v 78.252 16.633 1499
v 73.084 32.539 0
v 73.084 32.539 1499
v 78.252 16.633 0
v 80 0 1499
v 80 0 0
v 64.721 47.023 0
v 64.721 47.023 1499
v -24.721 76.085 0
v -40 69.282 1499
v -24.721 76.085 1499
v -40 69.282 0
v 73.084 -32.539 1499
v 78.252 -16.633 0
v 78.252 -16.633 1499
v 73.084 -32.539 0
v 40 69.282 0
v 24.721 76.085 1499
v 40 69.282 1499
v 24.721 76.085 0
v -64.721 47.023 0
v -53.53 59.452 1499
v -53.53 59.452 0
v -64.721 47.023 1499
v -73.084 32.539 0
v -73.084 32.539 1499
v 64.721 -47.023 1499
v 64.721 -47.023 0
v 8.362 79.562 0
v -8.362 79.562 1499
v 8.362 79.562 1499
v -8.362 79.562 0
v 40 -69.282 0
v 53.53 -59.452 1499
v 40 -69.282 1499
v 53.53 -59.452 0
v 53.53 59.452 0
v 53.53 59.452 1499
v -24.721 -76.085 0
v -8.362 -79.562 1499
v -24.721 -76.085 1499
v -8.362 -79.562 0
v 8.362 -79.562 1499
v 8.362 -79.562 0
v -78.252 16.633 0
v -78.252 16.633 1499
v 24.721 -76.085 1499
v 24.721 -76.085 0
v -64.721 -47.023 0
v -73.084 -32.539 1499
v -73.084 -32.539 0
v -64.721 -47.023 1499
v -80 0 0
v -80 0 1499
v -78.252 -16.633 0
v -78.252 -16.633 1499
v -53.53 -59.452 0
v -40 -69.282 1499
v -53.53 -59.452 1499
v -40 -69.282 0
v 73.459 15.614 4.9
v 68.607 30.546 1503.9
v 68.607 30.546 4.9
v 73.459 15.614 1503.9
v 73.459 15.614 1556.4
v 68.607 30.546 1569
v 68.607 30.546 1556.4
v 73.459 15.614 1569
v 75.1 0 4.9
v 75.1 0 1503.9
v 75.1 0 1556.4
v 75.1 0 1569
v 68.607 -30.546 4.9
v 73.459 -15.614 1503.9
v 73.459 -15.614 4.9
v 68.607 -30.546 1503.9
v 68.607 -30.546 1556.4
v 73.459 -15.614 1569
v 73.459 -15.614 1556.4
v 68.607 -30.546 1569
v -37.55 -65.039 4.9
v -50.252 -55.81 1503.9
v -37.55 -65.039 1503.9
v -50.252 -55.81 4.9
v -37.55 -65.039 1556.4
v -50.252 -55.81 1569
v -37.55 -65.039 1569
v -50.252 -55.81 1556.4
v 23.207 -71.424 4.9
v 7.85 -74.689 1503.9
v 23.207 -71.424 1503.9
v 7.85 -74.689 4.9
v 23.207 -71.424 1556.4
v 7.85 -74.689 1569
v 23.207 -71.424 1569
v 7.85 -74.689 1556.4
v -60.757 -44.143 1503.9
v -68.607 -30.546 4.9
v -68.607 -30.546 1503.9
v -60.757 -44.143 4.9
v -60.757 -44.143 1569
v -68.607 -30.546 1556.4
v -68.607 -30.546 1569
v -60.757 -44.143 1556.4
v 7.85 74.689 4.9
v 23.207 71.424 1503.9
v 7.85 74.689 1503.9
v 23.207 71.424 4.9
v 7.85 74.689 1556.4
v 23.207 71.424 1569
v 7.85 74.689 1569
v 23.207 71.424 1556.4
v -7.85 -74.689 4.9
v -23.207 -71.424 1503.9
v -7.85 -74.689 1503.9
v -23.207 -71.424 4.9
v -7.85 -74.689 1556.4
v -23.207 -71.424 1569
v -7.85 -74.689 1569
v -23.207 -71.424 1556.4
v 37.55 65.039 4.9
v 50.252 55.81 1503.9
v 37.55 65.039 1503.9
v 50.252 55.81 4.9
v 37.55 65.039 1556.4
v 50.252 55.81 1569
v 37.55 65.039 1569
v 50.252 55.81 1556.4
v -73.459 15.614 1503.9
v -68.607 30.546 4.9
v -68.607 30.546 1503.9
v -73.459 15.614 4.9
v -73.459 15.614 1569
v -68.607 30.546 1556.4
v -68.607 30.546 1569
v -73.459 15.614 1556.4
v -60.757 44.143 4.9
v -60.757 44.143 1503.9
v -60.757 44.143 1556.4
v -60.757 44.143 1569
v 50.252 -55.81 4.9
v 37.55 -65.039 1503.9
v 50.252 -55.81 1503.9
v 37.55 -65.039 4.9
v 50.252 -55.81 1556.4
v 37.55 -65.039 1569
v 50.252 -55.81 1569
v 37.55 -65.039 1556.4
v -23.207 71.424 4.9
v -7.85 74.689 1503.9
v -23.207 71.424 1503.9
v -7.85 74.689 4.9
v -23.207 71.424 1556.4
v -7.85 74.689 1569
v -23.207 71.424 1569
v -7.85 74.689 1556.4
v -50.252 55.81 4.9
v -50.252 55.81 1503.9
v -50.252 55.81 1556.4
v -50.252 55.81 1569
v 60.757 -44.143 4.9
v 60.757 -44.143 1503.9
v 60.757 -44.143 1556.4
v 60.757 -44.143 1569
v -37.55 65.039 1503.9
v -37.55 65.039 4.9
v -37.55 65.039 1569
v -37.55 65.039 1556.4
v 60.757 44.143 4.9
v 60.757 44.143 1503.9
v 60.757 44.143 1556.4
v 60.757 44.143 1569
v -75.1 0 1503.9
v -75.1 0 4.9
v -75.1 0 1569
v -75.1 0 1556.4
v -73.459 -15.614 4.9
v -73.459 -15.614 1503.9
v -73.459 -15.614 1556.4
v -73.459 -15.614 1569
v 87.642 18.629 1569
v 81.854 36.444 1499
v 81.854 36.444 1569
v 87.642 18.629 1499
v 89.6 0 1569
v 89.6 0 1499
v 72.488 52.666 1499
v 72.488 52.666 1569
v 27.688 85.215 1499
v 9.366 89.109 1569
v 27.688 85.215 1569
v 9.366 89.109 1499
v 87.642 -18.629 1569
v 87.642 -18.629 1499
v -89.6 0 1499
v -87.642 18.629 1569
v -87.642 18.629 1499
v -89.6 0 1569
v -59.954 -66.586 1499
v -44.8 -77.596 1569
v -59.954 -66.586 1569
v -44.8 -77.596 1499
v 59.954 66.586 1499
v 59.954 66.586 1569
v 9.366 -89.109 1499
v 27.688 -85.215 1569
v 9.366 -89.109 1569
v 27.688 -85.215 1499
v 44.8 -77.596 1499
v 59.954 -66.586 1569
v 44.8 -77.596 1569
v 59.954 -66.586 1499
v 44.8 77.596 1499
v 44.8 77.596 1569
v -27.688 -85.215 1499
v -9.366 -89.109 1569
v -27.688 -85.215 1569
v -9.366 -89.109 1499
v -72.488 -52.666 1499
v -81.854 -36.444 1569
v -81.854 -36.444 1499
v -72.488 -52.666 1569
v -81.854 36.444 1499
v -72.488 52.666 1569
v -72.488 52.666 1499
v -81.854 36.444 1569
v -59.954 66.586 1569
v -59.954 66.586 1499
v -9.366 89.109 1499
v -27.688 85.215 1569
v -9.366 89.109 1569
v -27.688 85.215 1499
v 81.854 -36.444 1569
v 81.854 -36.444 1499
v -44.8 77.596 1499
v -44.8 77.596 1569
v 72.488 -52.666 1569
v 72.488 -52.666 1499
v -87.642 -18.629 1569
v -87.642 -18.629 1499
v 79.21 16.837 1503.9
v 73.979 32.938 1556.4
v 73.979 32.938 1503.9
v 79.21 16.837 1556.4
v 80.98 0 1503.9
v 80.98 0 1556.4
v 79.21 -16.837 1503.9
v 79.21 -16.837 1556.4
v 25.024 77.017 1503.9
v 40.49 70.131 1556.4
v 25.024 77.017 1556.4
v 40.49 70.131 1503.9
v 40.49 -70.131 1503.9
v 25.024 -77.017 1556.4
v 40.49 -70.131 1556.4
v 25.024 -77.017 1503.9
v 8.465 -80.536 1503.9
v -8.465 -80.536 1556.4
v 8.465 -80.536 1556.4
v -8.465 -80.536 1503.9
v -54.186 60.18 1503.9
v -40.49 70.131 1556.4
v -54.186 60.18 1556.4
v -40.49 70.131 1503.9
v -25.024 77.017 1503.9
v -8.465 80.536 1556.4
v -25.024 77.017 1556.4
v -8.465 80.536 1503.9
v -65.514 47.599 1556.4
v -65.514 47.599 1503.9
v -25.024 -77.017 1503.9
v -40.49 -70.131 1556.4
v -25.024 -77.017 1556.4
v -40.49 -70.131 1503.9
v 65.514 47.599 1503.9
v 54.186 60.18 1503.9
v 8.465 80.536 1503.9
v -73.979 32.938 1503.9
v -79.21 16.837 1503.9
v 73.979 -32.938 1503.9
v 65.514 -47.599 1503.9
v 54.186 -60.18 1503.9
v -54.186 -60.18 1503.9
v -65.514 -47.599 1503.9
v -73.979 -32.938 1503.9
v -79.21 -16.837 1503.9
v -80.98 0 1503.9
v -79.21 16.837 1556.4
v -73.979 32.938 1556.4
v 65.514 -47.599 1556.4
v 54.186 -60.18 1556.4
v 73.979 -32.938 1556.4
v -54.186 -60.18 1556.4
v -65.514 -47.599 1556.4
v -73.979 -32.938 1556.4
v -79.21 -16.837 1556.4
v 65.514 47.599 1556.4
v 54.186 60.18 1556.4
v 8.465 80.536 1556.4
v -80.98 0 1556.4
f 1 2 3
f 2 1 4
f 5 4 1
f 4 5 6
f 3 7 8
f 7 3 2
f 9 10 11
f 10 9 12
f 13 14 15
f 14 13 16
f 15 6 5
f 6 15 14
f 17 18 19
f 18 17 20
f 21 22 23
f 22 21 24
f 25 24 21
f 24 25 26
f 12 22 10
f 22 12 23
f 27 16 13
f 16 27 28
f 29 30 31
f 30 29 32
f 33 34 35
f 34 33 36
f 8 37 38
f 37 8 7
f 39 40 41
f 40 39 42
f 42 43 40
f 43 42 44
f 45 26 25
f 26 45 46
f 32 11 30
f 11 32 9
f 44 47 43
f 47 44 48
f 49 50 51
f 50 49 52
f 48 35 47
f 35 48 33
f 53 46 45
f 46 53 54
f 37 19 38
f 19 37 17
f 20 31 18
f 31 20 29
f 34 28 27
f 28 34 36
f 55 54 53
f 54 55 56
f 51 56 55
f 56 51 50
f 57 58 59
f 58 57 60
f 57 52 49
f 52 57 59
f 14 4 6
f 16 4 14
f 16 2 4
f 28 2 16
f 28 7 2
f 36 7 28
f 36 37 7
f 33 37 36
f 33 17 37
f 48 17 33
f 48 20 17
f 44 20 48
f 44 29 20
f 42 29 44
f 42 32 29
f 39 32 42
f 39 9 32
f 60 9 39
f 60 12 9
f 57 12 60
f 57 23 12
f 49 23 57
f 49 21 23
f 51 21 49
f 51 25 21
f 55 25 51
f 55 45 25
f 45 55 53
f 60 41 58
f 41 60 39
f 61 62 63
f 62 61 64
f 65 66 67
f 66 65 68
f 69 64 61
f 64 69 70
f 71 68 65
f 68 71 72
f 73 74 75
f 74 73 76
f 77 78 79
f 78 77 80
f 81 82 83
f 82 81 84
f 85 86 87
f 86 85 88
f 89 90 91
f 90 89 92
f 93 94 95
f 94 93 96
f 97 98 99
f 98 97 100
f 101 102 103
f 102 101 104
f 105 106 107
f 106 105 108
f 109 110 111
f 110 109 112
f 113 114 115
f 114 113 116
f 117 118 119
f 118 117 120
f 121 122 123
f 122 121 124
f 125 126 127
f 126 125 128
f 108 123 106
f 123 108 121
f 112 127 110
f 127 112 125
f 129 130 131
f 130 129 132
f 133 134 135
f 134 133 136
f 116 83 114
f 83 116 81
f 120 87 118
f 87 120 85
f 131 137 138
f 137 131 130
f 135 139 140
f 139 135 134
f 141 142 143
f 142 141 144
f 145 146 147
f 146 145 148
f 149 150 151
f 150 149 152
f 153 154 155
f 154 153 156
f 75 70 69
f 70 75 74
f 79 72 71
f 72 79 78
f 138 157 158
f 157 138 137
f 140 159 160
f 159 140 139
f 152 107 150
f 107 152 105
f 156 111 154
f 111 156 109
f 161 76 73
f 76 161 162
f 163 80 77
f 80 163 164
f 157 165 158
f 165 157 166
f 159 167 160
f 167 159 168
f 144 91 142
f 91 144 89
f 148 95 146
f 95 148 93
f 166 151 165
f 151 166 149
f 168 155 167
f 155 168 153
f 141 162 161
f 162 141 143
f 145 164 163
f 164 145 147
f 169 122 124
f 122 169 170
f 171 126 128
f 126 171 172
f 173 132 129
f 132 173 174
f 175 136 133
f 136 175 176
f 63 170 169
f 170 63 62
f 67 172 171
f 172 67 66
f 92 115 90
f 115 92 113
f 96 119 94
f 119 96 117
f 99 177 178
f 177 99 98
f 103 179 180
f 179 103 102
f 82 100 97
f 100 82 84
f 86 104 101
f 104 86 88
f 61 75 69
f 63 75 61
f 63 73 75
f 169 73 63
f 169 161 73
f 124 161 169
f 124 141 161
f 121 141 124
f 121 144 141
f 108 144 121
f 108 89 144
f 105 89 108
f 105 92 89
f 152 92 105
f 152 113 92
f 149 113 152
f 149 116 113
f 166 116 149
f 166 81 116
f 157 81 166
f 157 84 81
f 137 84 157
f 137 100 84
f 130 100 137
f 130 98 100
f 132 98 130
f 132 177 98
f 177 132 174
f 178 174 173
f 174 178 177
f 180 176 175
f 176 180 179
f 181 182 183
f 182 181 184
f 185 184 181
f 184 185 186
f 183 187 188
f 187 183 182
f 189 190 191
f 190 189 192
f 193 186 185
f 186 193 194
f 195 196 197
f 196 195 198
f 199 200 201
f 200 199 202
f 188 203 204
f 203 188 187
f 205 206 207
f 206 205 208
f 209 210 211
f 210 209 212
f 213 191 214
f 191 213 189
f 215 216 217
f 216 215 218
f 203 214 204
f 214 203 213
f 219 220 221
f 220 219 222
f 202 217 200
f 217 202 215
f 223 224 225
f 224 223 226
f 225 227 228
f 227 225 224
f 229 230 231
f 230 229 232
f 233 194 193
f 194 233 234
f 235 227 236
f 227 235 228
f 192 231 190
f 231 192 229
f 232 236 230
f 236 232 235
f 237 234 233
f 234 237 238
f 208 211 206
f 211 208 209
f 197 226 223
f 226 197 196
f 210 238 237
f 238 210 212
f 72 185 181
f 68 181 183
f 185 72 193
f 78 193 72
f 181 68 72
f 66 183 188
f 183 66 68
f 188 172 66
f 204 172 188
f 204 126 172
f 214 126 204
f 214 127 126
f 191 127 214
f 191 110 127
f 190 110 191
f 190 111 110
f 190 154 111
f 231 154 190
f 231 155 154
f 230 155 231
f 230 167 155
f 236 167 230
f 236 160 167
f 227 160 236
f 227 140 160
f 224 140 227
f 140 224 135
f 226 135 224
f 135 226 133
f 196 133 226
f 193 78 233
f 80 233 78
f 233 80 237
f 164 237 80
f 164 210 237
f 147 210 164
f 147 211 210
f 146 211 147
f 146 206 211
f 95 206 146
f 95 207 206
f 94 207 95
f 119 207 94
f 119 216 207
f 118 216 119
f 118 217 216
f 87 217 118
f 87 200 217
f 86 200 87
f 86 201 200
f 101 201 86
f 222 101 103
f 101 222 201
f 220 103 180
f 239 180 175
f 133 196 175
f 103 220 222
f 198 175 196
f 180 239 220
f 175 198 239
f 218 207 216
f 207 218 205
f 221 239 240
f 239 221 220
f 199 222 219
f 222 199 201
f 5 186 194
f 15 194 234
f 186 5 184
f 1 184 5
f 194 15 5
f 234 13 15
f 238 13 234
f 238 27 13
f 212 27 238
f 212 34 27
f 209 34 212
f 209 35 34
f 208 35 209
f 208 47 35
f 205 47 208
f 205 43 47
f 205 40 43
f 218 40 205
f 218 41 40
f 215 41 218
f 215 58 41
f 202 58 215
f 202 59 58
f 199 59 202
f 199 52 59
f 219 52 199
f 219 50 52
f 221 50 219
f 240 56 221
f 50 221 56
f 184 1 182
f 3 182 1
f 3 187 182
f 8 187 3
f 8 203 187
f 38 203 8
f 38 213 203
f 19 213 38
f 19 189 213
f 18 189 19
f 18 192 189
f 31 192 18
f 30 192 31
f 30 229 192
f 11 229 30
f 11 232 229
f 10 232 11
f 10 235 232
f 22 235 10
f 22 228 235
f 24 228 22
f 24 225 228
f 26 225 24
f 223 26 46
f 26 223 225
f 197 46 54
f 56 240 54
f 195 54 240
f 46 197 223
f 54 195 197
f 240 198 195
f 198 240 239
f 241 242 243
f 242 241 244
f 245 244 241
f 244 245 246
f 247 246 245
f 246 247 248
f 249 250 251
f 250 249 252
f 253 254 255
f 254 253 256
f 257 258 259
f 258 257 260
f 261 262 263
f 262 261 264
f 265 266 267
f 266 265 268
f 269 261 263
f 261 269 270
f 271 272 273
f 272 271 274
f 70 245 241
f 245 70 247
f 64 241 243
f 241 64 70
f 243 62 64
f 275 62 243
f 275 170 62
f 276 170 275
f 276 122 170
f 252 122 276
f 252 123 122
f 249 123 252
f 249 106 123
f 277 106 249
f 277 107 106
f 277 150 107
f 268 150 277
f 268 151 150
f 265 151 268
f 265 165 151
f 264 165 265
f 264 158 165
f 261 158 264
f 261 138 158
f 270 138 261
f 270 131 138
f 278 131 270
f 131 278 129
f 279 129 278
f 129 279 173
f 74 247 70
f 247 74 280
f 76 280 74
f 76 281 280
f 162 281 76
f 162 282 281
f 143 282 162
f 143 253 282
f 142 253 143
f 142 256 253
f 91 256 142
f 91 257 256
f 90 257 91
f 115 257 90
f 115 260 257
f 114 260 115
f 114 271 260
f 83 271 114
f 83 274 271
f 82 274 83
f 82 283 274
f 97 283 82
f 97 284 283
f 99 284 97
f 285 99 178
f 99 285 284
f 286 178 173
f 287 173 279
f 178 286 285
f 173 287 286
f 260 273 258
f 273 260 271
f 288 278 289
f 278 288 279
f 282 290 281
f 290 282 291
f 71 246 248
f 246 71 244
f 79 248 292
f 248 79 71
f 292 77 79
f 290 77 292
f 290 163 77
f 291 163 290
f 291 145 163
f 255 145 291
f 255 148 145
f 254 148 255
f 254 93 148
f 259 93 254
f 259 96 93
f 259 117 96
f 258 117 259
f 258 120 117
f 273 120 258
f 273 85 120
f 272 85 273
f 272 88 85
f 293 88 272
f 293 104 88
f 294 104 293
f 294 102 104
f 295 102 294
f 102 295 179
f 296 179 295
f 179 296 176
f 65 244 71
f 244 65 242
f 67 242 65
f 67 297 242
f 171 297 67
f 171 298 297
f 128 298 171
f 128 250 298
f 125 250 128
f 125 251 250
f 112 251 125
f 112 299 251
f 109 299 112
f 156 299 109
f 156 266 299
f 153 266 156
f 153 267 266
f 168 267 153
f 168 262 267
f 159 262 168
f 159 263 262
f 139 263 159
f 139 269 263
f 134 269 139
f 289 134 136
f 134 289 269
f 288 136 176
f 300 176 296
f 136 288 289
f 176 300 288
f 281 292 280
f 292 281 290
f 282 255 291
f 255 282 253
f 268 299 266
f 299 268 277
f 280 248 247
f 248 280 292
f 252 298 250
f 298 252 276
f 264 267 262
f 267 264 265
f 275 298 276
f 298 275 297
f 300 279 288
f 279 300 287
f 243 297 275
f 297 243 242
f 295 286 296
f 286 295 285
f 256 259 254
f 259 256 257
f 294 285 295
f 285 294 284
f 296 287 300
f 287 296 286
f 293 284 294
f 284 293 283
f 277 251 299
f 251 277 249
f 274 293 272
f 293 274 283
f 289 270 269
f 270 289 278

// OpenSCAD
// Parameters
pipe_standard = 1; //[1:1:1]
nominal_size = 160; //[80:320:1]
length_mm = 1500; //[750:3000:1]
pipe_od = 160; //[80:320:1]
pipe_wall = 4.9; //[2.5:10:0.1]
fitting_length = 70; //[35:140:1]
fitting_od_factor = 1.12; //[1.05:1.25:0.01]
fitting_wall_factor = 1.3; //[1.0:2.0:0.05]
socket_depth_factor = 0.75; //[0.5:0.95:0.01]
overlap = 1; //[0.5:2:0.1]
orientation_axis_aligned = 1; //[1:1:1]

// HT Pipe - complete geometry
module ht_pipe() {
  color([0.85, 0.85, 0.8]) {
    // Pipe body
    difference() {
      cylinder(h=length_mm, r=pipe_od/2, center=false);
      translate([0, 0, pipe_wall])
        cylinder(h=length_mm, r=pipe_od/2 - pipe_wall, center=false);
    }
    
    // End fitting
    difference() {
      translate([0, 0, length_mm - overlap])
        cylinder(h=fitting_length, r=(pipe_od * fitting_od_factor) / 2, center=false);
      
      // Socket void
      translate([0, 0, length_mm - overlap + pipe_wall])
        cylinder(h=fitting_length * socket_depth_factor, r=pipe_od/2 + pipe_wall * 0.2, center=false);
      
      // Through bore void
      translate([0, 0, length_mm - overlap])
        cylinder(h=fitting_length + overlap, r=pipe_od/2 - pipe_wall, center=false);
    }
  }
}

// Assembly
module assembly() {
  ht_pipe();
}

assembly();
